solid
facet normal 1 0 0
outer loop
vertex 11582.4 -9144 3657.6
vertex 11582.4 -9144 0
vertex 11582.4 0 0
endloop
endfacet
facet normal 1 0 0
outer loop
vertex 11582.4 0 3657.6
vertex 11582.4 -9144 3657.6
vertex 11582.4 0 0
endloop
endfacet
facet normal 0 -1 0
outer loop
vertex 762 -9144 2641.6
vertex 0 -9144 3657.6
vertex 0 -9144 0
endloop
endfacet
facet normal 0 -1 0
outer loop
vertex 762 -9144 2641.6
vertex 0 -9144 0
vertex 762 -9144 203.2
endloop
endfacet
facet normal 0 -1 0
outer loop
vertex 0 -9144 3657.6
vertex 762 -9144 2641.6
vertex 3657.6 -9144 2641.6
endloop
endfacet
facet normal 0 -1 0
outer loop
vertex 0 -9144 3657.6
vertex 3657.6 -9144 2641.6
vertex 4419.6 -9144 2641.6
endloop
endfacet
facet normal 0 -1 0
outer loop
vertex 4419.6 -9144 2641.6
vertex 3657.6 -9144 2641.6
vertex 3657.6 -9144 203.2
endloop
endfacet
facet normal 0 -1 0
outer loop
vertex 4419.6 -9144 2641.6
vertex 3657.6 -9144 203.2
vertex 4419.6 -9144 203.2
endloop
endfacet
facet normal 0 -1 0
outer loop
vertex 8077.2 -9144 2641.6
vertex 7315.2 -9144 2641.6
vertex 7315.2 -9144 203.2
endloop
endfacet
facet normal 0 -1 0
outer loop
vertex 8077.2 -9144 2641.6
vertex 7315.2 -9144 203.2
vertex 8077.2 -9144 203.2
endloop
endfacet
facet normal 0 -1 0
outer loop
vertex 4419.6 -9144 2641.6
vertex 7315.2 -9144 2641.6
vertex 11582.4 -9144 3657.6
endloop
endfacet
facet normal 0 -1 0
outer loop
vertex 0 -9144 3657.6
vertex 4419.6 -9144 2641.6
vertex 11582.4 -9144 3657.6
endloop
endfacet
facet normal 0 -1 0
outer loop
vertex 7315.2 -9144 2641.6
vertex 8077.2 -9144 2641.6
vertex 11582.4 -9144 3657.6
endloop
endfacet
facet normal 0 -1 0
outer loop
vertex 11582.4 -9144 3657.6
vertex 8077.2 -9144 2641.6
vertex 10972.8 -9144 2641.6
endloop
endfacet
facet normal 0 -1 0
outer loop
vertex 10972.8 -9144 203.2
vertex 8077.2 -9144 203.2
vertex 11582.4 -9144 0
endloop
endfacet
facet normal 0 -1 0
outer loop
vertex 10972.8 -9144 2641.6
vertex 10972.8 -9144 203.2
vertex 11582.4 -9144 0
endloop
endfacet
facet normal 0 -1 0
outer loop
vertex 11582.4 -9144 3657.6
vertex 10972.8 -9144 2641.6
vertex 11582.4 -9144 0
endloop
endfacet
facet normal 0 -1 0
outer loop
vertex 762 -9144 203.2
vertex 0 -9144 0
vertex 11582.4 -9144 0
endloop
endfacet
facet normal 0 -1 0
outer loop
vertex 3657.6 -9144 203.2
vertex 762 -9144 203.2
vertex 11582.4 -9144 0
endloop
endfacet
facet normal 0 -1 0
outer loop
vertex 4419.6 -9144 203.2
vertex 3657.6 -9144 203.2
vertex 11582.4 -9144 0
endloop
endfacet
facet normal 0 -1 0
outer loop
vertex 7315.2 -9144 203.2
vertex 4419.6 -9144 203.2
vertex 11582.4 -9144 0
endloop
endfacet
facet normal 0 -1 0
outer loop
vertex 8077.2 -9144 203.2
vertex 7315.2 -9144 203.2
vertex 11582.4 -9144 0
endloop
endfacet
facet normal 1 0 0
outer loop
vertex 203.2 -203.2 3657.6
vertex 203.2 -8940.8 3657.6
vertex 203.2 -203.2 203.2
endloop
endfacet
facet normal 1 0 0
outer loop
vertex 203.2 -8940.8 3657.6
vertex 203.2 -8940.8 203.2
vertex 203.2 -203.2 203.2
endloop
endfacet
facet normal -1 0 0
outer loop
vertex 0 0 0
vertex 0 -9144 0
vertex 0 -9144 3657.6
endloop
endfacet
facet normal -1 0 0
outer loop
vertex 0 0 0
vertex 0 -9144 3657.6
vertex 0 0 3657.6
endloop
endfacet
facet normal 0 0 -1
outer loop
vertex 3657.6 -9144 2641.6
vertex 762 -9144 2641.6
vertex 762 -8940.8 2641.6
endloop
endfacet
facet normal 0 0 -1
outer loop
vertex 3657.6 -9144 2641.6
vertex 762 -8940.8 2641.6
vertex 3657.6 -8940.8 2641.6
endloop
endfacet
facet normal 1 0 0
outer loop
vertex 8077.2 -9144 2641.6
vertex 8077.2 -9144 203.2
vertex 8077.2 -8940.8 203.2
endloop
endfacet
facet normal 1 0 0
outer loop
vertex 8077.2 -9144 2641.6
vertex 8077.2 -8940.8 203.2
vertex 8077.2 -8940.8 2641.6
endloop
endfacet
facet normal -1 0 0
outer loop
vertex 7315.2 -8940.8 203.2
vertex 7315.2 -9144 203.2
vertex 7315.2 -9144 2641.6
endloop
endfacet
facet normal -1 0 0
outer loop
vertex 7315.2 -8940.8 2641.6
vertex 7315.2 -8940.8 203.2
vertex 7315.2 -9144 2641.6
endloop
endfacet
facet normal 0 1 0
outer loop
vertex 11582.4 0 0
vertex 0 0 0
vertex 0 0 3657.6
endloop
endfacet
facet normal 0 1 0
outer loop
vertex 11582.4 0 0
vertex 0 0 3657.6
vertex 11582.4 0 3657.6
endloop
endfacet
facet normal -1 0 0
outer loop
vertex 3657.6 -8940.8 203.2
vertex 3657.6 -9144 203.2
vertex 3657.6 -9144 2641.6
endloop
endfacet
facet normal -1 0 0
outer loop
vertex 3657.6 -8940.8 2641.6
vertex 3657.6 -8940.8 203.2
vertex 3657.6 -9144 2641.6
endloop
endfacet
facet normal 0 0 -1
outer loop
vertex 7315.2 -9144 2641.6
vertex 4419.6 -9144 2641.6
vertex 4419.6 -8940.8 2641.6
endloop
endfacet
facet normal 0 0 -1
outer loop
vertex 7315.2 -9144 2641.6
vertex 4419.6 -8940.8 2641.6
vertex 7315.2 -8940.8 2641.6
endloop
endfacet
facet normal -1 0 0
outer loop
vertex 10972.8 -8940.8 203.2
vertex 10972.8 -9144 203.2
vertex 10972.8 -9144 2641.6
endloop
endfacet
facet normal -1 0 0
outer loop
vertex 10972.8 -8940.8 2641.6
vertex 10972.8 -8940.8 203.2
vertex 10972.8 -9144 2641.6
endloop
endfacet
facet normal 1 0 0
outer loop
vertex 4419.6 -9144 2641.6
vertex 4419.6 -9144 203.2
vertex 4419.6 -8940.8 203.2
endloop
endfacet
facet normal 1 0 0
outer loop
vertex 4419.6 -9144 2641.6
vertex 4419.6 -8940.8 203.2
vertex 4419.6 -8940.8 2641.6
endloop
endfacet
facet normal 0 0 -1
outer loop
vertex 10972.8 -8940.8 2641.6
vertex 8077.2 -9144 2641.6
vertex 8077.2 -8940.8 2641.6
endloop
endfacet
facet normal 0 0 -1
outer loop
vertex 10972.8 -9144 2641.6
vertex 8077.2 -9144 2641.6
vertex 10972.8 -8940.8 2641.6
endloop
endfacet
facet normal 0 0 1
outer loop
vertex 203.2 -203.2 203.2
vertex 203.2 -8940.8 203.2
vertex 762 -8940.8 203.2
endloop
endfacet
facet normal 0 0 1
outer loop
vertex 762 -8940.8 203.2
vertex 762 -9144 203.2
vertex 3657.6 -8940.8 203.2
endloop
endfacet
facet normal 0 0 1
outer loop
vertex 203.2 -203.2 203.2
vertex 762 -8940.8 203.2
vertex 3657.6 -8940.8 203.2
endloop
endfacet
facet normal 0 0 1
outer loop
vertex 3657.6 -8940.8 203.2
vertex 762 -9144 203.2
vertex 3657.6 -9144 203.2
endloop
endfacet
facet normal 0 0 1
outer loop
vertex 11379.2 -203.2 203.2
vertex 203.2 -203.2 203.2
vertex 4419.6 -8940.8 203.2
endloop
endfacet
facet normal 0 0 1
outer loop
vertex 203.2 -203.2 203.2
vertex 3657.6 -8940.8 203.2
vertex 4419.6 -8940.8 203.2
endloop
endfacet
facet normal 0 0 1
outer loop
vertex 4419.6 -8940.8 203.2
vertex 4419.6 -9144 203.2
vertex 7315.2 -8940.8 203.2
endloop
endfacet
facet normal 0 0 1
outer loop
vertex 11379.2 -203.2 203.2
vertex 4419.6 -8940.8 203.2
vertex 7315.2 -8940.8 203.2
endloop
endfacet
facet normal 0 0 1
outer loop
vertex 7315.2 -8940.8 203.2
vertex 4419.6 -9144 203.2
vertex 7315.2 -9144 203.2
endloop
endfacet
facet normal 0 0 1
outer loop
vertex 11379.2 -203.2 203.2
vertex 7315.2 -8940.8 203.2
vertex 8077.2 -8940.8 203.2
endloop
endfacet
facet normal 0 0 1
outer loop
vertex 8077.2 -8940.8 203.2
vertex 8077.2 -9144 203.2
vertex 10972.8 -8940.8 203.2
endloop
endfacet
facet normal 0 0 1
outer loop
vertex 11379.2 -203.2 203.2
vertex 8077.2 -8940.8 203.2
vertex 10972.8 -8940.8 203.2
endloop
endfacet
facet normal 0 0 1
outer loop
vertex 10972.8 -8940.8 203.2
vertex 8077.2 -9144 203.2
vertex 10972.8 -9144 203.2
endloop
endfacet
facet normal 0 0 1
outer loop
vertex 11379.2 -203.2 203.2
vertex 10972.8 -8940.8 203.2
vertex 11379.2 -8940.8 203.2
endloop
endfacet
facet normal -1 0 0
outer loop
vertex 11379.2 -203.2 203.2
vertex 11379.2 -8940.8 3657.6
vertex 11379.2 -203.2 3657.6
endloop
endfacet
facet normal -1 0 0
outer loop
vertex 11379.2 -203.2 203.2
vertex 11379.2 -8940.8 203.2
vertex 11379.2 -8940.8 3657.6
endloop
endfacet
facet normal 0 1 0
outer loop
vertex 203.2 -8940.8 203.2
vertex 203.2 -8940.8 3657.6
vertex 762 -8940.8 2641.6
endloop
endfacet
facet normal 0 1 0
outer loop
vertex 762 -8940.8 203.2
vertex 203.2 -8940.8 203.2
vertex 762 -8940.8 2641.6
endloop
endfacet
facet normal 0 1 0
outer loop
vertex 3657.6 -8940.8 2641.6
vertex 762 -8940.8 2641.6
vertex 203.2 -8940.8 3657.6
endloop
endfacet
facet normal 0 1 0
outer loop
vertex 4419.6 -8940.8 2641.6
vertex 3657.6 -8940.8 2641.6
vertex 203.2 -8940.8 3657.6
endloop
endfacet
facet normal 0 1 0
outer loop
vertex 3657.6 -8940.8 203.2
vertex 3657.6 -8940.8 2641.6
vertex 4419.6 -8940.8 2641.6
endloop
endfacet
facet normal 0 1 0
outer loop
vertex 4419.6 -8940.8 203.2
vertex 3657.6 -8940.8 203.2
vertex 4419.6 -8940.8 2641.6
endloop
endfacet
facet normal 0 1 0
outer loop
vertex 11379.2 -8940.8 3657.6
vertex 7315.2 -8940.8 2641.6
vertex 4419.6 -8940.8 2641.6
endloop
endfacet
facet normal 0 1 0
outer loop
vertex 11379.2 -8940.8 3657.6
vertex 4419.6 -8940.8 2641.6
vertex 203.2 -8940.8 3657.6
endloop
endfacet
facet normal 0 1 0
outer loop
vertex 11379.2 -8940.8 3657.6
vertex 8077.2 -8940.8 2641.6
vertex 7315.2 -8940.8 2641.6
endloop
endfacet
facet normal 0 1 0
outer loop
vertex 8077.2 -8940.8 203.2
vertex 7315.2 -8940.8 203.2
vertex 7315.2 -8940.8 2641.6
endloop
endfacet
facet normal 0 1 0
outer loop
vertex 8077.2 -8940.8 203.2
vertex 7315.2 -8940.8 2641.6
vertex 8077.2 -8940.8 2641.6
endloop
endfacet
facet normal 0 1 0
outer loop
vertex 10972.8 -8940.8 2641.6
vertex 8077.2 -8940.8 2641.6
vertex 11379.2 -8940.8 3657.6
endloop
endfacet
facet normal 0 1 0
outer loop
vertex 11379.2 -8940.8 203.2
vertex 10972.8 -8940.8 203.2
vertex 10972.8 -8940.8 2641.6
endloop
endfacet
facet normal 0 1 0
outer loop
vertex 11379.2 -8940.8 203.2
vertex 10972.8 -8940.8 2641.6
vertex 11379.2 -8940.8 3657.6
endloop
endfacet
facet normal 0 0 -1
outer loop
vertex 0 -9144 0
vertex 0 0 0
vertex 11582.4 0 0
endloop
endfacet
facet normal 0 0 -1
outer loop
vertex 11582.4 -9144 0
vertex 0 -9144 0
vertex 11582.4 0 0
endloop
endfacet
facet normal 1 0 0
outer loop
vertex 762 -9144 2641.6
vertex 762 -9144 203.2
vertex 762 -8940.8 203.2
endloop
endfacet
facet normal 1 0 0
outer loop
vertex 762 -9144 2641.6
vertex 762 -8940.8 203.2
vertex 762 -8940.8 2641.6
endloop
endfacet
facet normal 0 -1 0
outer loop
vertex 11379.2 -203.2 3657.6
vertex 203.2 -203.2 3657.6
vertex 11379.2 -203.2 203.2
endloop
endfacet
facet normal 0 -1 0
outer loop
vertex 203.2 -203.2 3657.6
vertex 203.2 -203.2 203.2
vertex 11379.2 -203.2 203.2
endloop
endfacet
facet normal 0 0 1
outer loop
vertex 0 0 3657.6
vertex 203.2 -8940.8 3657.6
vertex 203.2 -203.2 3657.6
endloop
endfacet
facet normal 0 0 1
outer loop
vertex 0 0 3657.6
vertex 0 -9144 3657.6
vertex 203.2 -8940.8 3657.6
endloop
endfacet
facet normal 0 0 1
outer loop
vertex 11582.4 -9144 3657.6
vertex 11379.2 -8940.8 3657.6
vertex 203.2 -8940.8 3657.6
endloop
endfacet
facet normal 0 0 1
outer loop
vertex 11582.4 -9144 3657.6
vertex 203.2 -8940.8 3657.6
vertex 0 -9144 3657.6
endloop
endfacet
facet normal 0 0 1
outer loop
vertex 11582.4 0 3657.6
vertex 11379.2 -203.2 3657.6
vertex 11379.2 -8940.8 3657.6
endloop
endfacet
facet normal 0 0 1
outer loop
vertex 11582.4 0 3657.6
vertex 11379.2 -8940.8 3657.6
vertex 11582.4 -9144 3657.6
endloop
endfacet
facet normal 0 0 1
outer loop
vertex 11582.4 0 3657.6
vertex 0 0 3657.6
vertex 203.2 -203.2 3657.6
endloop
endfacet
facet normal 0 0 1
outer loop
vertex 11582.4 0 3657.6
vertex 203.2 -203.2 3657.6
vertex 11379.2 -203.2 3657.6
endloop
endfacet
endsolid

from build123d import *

# Parameters (mm, degrees)
F0_W     = 11582.4
F0_H     = 9144
F1_DEPTH = 3657.6
F2_T     = -203.2
F3_W     = 2895.6
F3_H     = 2438.4
F4_DEPTH = 203.2


with BuildPart() as f1:
    # F0 (on Top) → F1 (new body)
    with BuildSketch(Plane.XY):
        with Locations((5791.2, -4572)):
            Rectangle(F0_W, F0_H)
    extrude(amount=F1_DEPTH)

    # F2
    f2_openings = [f1.faces().sort_by_distance(p)[0] for p in [
        (5791.2, -4572, 3657.6),
    ]]
    offset(amount=F2_T, openings=f2_openings)

    # F3 (on face) → F4 (cut, through all)
    with BuildSketch(Plane.XZ.offset(9144)):
        with Locations((2209.8, 1422.4)):
            Rectangle(F3_W, F3_H)
        with Locations((5867.4, 1422.4)):
            Rectangle(F3_W, F3_H)
        with Locations((9525, 1422.4)):
            Rectangle(F3_W, F3_H)
    extrude(amount=-F4_DEPTH, mode=Mode.SUBTRACT)


solid = f1.part
